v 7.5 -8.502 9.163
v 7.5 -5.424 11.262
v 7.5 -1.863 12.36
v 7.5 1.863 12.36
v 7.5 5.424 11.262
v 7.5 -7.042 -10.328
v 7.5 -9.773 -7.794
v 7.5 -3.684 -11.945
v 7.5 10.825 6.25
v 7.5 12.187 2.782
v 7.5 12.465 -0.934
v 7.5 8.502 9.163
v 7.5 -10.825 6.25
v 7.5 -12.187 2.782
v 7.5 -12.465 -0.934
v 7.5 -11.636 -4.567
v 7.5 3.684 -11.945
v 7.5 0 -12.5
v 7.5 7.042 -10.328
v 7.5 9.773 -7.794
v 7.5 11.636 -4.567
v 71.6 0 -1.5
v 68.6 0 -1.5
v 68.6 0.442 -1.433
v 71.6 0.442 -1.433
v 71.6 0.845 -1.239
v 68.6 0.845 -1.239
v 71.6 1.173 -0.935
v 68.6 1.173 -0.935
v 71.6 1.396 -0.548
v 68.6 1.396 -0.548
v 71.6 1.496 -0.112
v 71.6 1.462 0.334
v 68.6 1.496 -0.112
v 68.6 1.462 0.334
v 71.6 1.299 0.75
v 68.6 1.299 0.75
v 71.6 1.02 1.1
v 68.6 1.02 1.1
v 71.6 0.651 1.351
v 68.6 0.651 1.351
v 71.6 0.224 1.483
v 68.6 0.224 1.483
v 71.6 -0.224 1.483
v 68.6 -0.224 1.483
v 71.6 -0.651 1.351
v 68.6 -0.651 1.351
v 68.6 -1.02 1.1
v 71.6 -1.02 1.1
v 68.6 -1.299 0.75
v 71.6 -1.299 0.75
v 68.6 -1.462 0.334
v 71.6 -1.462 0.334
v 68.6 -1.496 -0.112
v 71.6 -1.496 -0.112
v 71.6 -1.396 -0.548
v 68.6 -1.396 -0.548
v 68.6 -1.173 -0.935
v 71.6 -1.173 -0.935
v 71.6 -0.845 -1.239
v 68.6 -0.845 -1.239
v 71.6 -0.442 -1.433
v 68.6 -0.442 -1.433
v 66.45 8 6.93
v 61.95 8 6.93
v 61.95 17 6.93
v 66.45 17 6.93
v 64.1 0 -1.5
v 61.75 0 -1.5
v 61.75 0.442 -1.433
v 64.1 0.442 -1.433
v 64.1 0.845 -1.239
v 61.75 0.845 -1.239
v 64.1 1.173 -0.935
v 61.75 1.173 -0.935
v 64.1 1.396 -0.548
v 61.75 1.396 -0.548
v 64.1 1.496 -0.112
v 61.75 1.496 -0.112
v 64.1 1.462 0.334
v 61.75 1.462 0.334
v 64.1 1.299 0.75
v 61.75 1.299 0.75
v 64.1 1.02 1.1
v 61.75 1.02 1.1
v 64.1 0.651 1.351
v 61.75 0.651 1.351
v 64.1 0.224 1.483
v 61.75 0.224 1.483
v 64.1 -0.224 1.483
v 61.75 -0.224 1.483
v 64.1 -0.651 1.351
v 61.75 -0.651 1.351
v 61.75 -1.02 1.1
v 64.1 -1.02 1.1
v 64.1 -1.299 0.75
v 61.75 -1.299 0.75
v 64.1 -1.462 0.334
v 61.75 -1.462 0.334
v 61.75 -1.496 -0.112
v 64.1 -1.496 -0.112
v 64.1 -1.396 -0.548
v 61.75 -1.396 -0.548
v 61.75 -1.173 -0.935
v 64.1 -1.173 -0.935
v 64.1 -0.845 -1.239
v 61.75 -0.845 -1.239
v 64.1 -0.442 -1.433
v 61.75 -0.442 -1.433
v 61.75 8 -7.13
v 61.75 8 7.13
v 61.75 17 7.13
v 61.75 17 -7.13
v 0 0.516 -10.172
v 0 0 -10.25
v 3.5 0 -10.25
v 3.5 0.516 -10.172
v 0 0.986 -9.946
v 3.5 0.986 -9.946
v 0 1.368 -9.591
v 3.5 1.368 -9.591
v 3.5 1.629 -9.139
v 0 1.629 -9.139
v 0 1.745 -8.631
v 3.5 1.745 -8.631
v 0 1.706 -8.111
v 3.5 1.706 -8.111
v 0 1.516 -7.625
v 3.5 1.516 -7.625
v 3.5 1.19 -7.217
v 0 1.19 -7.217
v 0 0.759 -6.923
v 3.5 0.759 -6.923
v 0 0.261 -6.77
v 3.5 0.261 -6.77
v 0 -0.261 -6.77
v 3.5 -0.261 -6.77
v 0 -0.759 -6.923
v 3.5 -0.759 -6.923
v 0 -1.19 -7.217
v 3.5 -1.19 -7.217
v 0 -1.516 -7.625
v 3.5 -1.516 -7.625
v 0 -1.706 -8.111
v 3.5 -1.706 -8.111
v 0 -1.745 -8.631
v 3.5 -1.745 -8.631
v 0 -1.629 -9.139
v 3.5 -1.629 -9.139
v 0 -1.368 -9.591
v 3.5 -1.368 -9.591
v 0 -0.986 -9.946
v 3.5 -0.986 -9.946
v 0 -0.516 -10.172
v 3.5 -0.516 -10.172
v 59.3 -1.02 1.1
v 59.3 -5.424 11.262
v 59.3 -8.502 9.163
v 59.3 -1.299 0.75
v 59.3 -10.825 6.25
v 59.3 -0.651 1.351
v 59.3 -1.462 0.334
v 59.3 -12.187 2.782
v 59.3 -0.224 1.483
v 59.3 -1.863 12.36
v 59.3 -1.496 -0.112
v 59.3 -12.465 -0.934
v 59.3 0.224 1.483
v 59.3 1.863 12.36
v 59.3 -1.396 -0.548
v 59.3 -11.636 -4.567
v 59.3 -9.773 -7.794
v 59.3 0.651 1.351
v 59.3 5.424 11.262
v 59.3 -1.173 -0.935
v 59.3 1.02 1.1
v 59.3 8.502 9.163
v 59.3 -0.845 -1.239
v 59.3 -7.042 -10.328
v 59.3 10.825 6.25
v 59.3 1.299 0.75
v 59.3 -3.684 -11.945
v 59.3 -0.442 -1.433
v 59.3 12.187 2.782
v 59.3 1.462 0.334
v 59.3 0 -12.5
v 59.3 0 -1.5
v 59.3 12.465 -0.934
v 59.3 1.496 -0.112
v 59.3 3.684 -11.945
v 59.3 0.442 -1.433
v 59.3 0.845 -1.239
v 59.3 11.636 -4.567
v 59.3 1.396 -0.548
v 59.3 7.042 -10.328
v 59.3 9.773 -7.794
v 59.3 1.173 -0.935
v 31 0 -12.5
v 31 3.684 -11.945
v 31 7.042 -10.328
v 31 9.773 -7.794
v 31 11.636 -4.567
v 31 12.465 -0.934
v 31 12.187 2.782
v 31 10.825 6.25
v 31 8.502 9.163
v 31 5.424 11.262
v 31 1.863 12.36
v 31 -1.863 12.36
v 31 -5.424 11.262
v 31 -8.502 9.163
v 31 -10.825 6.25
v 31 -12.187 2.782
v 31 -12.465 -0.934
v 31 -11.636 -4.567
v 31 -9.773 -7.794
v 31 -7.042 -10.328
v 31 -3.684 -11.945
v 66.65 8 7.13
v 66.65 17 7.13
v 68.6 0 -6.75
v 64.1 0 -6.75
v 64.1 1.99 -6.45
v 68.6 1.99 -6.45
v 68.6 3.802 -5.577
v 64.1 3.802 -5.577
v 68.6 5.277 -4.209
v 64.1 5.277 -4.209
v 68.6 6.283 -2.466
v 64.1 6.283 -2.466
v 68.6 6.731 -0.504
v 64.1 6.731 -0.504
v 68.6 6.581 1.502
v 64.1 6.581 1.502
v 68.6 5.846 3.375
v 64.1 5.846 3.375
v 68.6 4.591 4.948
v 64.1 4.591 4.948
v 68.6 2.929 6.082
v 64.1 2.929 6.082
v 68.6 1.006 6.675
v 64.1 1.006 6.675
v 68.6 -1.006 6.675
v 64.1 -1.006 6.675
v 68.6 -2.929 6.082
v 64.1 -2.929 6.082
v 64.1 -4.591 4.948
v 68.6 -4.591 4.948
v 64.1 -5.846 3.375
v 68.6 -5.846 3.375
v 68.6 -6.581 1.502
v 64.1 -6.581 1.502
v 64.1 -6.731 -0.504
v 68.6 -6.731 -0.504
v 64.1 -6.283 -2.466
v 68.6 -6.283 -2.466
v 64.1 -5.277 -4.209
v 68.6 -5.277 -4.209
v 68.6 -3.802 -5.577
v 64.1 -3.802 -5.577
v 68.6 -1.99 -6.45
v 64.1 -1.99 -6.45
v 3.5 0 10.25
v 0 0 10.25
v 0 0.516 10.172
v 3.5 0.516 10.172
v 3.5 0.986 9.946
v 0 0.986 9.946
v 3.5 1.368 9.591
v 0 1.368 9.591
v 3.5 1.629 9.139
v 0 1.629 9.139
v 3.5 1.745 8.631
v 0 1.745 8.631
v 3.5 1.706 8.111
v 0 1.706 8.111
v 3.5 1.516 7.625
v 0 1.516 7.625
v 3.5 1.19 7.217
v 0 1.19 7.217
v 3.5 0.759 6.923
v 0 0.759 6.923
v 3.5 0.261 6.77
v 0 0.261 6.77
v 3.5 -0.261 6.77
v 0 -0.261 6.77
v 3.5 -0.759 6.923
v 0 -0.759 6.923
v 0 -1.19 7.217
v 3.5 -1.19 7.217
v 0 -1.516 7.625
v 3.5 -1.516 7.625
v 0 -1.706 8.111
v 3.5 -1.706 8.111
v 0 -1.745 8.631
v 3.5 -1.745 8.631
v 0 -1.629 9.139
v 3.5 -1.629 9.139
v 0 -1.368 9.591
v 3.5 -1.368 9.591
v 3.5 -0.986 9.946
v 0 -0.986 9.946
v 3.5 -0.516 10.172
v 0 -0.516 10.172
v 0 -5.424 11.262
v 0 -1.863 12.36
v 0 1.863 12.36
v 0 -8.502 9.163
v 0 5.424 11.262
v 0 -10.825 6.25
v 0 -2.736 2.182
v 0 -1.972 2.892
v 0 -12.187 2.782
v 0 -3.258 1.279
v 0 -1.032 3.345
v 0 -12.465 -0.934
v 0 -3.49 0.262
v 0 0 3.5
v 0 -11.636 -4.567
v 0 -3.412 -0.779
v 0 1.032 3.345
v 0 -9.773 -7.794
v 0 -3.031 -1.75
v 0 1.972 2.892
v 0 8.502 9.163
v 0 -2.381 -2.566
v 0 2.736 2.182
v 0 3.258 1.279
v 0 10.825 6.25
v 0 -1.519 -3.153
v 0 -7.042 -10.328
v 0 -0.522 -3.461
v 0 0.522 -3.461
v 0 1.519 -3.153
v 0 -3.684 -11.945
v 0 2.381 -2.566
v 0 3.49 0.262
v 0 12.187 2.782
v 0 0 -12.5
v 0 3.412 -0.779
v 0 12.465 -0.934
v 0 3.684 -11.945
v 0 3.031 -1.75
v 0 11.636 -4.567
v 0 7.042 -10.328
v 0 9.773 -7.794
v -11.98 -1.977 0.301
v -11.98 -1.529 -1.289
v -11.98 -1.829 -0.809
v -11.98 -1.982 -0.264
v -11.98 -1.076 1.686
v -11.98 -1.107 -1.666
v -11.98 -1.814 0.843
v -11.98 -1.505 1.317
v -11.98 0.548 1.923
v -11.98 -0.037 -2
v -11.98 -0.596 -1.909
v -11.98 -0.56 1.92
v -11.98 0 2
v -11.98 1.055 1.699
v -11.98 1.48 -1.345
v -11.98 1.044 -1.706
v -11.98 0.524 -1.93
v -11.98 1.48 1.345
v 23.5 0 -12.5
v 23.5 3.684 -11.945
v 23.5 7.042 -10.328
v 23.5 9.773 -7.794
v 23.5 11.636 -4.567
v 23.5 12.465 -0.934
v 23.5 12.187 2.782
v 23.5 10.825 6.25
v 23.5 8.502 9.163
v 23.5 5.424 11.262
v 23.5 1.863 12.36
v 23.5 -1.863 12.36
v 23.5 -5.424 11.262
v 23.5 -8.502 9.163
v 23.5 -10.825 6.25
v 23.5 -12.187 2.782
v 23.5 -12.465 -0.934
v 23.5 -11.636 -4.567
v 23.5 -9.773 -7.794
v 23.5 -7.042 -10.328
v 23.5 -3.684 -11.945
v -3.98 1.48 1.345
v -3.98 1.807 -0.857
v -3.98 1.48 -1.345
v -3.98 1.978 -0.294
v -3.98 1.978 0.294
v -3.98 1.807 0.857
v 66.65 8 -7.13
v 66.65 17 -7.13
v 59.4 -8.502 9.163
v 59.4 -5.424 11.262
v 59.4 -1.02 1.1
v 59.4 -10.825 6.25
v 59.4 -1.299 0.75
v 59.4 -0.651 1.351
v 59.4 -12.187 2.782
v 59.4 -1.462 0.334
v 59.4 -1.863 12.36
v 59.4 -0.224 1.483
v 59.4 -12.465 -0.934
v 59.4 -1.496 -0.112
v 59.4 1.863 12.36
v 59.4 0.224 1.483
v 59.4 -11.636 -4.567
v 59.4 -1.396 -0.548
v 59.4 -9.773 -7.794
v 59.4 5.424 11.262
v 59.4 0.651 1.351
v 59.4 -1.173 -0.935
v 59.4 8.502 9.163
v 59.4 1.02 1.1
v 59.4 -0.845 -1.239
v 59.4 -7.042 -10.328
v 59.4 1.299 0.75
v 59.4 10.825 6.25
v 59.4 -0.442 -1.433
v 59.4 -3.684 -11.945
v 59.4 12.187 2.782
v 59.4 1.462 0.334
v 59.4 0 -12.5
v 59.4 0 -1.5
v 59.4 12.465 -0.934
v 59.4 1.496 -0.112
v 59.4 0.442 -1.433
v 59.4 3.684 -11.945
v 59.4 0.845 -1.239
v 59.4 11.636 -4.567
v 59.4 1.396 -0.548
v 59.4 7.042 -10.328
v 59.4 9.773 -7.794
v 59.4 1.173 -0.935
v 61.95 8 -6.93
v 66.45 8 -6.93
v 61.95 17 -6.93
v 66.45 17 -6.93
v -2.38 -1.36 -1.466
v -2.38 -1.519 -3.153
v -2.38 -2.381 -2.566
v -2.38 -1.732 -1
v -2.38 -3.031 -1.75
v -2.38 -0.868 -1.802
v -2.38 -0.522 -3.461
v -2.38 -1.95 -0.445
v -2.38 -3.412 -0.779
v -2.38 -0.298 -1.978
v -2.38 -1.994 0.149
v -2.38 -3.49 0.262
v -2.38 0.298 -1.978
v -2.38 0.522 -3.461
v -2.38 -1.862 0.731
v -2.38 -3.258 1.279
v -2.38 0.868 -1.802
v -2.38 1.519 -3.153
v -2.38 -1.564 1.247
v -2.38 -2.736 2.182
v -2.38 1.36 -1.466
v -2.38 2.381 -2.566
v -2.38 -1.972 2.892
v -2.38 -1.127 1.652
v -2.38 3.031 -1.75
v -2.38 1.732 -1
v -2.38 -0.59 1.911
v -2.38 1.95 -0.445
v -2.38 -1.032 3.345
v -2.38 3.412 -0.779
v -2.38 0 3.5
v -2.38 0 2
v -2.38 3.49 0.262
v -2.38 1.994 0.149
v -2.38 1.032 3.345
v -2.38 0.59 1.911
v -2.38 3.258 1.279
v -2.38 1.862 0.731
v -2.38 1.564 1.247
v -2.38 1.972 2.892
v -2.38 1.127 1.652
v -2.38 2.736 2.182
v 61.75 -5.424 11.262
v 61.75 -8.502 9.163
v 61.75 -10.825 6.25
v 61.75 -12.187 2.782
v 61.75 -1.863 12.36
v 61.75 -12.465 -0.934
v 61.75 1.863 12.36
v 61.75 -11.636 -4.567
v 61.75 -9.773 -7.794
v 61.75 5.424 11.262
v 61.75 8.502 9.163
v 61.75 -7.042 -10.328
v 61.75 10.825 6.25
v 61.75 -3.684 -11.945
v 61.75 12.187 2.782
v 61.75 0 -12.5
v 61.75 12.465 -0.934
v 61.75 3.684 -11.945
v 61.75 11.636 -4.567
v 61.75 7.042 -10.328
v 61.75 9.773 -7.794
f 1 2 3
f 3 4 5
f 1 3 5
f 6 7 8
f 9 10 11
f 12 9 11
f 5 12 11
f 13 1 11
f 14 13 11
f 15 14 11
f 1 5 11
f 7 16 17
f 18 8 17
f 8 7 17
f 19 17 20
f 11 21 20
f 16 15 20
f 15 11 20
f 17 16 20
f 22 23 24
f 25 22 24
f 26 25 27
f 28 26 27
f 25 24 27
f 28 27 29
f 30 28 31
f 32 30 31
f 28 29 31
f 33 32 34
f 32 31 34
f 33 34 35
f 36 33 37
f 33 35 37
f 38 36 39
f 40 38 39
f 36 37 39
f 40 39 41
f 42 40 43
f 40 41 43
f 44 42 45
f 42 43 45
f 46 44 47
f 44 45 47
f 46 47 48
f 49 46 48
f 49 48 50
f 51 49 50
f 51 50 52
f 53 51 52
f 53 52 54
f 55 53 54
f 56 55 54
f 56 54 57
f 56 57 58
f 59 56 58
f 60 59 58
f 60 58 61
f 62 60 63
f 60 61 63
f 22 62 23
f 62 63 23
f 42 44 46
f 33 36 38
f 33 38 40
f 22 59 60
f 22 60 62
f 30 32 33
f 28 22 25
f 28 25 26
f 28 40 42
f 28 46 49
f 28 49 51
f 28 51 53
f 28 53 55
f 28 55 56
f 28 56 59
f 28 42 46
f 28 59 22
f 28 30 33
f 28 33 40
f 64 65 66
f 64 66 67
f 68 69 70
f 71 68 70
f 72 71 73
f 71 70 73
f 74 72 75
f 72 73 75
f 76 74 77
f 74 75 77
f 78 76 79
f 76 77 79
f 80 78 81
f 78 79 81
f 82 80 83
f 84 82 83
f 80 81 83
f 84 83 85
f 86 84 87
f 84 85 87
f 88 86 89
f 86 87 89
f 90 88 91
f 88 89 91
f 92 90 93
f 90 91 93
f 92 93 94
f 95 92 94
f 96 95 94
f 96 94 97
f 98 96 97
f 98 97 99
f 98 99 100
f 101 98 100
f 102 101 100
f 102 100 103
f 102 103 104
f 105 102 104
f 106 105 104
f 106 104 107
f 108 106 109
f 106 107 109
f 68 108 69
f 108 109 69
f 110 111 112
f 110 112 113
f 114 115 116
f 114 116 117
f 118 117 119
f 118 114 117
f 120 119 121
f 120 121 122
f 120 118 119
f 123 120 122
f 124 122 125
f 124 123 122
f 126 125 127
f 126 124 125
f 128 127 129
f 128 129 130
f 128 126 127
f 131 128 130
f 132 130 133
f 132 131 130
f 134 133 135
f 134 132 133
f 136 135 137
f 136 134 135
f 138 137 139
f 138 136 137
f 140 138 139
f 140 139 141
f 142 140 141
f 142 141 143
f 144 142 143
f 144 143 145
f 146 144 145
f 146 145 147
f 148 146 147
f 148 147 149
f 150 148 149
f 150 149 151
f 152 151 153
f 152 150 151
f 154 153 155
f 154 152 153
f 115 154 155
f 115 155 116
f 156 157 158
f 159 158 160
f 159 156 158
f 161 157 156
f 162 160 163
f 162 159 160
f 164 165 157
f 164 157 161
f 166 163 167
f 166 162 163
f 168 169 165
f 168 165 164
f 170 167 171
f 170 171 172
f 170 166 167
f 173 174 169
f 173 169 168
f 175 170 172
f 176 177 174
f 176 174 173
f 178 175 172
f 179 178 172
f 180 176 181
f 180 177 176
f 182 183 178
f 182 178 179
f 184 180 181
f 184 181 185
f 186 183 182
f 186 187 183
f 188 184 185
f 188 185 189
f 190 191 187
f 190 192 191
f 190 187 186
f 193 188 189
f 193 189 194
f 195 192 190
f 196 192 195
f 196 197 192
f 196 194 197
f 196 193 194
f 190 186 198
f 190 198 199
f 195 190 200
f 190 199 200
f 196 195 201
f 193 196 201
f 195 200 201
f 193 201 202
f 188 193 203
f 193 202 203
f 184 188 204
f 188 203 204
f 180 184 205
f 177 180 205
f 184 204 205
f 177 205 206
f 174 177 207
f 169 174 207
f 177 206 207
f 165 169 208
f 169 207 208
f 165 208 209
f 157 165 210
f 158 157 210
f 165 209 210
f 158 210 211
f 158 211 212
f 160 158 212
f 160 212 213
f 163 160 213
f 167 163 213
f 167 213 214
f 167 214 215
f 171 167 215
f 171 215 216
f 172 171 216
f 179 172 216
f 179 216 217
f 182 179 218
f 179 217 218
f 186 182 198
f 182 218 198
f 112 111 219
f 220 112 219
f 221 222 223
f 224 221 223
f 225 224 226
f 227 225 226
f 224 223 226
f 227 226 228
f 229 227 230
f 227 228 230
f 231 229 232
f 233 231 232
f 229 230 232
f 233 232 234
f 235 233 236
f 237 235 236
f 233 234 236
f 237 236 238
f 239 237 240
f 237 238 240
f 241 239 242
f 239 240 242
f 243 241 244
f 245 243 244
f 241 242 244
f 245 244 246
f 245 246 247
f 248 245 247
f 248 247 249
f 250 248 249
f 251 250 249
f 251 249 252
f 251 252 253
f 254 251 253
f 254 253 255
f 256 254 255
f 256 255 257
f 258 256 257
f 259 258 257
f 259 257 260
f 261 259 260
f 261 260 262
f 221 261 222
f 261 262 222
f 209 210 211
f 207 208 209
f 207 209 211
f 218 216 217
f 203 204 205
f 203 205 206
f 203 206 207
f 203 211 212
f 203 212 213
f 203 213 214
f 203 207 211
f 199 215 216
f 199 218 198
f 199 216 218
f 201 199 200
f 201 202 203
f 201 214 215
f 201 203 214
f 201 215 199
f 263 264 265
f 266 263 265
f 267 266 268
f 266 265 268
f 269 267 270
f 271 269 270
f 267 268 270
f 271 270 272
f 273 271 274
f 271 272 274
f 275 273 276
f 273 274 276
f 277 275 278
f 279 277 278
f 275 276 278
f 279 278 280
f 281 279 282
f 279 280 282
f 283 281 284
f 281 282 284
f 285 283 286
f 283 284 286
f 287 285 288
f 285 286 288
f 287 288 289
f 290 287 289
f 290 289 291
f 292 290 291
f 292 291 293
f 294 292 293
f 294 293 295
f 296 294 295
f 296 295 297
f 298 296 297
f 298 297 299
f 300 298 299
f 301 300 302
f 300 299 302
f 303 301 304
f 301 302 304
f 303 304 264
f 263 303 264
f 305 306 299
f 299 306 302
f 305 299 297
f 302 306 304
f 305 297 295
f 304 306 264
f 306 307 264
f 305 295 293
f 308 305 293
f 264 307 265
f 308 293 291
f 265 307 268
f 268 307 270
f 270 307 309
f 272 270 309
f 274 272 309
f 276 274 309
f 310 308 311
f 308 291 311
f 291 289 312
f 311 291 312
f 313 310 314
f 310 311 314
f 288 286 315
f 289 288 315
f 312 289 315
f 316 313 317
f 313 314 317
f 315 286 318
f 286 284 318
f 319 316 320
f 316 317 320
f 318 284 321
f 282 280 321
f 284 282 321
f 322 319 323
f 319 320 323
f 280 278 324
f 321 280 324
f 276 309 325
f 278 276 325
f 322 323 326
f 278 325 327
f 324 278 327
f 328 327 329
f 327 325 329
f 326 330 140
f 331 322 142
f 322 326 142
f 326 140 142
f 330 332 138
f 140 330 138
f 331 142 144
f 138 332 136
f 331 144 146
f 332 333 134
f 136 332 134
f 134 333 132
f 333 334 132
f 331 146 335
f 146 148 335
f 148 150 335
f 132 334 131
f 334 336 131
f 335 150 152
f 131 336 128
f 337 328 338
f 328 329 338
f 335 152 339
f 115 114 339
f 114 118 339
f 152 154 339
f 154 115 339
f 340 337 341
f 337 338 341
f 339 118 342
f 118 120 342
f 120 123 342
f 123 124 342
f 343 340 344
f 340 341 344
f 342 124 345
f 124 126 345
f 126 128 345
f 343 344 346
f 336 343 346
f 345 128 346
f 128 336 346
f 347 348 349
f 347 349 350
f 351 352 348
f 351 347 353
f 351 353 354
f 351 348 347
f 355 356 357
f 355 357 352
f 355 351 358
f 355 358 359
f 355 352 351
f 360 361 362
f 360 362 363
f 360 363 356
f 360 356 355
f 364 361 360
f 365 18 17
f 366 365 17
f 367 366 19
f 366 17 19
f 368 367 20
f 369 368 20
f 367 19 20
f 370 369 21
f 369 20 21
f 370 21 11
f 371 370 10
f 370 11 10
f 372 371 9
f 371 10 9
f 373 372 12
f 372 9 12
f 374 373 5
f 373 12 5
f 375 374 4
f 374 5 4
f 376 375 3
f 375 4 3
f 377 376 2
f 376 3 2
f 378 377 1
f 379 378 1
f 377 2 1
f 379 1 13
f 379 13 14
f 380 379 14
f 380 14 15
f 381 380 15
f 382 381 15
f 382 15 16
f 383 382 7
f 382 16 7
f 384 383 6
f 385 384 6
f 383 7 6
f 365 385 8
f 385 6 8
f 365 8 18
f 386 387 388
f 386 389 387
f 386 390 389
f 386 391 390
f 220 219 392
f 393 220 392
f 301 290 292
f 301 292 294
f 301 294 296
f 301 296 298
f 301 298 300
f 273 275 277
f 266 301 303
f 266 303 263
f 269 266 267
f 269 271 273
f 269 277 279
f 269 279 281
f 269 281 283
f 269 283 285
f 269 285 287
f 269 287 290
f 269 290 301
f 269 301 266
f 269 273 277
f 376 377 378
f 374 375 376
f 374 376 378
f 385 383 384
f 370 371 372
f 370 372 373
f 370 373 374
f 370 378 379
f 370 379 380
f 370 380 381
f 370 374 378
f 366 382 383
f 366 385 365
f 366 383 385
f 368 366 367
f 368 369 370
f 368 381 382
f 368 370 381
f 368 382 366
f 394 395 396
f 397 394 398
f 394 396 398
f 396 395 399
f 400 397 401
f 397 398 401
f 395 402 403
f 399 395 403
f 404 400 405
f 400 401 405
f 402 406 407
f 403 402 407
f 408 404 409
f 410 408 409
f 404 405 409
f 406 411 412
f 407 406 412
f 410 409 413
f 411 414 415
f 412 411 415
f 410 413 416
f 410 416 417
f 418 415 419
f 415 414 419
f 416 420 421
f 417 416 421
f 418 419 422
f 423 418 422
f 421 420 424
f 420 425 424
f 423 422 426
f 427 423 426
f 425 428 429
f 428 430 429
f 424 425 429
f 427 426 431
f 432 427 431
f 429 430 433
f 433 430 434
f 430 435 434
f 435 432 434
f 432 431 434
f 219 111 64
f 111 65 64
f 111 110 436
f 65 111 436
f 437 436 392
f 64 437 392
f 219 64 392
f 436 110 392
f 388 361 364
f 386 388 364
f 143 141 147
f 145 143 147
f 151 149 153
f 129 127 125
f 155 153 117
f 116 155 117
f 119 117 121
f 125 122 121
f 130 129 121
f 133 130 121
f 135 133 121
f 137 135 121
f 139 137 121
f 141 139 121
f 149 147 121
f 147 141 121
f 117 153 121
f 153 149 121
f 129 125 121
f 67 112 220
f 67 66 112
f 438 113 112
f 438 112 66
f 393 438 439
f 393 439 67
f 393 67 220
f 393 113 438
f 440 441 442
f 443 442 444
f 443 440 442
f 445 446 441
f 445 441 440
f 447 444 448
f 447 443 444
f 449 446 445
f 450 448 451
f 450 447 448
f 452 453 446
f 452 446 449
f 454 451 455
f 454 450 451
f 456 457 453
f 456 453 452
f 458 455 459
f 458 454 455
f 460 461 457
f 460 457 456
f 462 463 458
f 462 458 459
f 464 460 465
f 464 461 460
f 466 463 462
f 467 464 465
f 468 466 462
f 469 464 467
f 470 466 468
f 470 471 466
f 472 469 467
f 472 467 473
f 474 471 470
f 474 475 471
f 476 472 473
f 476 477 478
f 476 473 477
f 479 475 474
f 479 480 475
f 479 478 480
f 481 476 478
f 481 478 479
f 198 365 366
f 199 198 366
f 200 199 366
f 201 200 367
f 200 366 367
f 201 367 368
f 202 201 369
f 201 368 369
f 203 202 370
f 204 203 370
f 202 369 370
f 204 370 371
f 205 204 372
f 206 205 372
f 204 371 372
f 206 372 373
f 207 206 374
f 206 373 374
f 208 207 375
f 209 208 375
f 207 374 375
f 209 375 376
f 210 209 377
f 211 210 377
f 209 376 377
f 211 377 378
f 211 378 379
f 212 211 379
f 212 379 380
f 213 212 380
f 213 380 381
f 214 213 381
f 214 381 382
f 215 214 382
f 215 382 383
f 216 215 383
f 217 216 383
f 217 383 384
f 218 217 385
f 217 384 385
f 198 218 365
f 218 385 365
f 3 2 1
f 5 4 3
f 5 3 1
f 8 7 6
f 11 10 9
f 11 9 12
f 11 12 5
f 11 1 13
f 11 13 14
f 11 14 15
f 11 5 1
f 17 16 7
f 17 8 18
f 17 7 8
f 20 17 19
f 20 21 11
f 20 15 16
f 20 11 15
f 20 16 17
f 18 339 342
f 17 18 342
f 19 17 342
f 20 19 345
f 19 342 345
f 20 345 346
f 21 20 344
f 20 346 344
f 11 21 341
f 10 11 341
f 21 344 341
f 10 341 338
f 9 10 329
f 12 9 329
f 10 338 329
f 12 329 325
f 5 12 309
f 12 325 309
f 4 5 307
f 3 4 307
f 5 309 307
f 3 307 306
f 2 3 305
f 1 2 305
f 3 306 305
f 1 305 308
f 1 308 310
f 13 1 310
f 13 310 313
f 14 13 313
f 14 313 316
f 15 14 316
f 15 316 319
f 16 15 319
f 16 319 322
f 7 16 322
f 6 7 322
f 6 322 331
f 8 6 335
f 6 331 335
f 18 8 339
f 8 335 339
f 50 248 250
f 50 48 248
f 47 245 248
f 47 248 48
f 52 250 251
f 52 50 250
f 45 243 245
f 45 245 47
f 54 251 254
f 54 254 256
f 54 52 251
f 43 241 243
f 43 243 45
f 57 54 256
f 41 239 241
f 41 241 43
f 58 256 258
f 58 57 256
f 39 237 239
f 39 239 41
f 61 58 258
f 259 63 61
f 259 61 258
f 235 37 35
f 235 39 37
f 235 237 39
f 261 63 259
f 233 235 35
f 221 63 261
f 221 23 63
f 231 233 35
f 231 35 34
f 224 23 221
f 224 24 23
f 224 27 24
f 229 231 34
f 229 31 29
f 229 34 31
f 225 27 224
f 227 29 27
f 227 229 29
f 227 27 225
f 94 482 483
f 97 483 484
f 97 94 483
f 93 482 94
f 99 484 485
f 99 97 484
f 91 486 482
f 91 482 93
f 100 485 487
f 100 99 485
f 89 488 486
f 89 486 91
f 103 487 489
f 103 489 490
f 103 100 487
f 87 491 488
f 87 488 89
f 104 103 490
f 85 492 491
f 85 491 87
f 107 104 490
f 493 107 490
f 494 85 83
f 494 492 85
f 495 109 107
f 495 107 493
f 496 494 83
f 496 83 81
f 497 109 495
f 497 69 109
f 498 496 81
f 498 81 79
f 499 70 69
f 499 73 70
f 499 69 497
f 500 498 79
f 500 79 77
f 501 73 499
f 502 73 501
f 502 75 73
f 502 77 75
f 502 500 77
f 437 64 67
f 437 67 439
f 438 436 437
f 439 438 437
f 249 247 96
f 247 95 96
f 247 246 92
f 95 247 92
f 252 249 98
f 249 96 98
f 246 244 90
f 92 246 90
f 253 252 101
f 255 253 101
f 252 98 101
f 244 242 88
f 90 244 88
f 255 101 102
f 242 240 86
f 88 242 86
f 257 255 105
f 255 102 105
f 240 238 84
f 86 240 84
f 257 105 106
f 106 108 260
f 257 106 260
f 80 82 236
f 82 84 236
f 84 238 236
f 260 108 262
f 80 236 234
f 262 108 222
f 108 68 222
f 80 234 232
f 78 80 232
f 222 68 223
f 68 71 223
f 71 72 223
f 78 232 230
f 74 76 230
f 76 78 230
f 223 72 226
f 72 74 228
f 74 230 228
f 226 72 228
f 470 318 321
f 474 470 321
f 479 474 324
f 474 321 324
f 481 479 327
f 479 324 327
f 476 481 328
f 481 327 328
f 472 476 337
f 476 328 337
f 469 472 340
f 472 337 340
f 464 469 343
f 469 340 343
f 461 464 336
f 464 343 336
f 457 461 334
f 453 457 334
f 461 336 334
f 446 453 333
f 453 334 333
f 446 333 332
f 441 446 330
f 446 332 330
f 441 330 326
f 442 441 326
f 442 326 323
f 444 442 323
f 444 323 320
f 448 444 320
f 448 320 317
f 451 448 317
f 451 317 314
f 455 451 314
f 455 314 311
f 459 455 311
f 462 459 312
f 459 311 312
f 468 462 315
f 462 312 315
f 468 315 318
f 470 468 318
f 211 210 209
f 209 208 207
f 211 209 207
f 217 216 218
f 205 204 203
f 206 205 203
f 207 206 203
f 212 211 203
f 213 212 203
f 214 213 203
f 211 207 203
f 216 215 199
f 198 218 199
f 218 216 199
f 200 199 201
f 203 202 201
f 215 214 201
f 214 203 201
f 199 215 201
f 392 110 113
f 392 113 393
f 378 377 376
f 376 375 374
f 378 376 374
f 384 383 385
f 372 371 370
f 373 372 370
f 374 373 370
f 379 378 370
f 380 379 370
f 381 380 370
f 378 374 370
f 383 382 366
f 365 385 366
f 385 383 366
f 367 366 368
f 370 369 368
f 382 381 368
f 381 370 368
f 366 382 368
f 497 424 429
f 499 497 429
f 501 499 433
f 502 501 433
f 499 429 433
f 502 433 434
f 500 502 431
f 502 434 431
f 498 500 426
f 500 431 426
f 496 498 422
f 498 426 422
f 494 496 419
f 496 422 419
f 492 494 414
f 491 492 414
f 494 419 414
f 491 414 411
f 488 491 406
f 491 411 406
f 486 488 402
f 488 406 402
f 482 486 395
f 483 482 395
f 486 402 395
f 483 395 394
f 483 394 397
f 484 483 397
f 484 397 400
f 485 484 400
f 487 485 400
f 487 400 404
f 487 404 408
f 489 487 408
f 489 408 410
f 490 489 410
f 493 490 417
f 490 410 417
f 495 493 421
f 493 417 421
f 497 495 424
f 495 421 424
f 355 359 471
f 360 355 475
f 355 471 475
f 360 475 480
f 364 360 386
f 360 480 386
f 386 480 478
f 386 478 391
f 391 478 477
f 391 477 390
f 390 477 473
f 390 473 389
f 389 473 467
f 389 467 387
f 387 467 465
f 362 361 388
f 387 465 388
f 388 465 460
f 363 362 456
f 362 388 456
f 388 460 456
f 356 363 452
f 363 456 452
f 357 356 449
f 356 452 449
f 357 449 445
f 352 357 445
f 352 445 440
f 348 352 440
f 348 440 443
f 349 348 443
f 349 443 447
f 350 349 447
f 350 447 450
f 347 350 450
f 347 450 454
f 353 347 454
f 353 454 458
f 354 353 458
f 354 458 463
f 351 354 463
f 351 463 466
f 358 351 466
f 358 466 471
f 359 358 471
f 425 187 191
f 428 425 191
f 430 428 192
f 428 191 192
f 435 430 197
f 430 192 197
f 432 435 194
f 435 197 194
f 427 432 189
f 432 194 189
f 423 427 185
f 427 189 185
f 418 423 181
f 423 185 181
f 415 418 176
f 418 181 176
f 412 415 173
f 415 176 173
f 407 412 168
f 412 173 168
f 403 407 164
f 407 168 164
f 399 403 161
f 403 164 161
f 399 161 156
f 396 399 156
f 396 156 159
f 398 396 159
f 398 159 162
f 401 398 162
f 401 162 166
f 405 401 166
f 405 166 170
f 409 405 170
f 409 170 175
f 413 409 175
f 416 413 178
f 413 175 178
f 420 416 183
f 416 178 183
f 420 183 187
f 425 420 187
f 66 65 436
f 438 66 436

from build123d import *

# Parameters (mm, degrees)
SKETCH_1_R          = 12.5
EXTRUDE_1_DEPTH     = 7.5
SKETCH_3_R          = 12.5
EXTRUDE_3_DEPTH     = 16
SKETCH_4_R          = 12.5
EXTRUDE_4_DEPTH     = 7.5
SKETCH_5_R          = 12.5
EXTRUDE_5_DEPTH     = 28.3
SKETCH_6_R          = 1.5
EXTRUDE_10_DEPTH    = 0.1
SKETCH_10_R         = 12.5
EXTRUDE_11_DEPTH    = 2.35
SKETCH_12_R         = 1.5
EXTRUDE_12_DEPTH    = 2.35
SKETCH_13_R         = 6.75
EXTRUDE_13_DEPTH    = 4.5
SKETCH_14_R         = 1.5
EXTRUDE_14_DEPTH    = 3
EXTRUDE_START       = 8
SKETCH_15_W         = 4.9
SKETCH_15_H         = 14.26
SKETCH_15_W_2       = 4.5
SKETCH_15_H_2       = 13.86
EXTRUDE_1_2_DEPTH   = 9
SKETCH_16_R         = 3.5
EXTRUDE_15_DEPTH    = 2.38
SKETCH_17_R         = 2
EXTRUDE_16_DEPTH    = 9.6
SKETCH_18_W         = 2.690427476
SKETCH_18_H         = 0.755115775
CUT_EXTRUDE_1_DEPTH = 8
SKETCH_19_R         = 1.75
CUT_EXTRUDE_2_DEPTH = 3.5


with BuildPart() as part:
    # 草图1 → Extrude 1 (new body)
    with BuildSketch(Plane(origin=(0, 0, 0), x_dir=(0, 0, -1), z_dir=(1, 0, 0))):
        Circle(SKETCH_1_R)
    extrude(amount=EXTRUDE_1_DEPTH)

    # 草图16 → 凸台-拉伸15 (add)
    with BuildSketch(Plane.ZY):
        Circle(SKETCH_16_R)
    extrude(amount=EXTRUDE_15_DEPTH)

    # 草图17 → 凸台-拉伸16 (add)
    with BuildSketch(Plane.ZY.offset(2.38)):
        Circle(SKETCH_17_R)
    extrude(amount=EXTRUDE_16_DEPTH)

    # 草图18 → 切除-拉伸1 (cut)
    with BuildSketch(Plane.ZY.offset(11.98)):
        with Locations((0, 1.857557888)):
            Rectangle(SKETCH_18_W, SKETCH_18_H)
    extrude(amount=-CUT_EXTRUDE_1_DEPTH, mode=Mode.SUBTRACT)

    # 草图19 → 切除-拉伸2 (cut)
    with BuildSketch(Plane.ZY):
        with Locations((8.5, 0)):
            Circle(SKETCH_19_R)
    cut_extrude_2 = extrude(amount=-CUT_EXTRUDE_2_DEPTH, mode=Mode.SUBTRACT)

    # 镜向1: 切除-拉伸2 across plane
    add(cut_extrude_2.mirror(Plane.XY), mode=Mode.SUBTRACT)


with BuildPart() as body_2:
    # 草图3 → 凸台-拉伸3 (new body)
    with BuildSketch(Plane(origin=(7.5, 0, 0), x_dir=(0, 0, -1), z_dir=(1, 0, 0))):
        Circle(SKETCH_3_R)
    extrude(amount=EXTRUDE_3_DEPTH)


with BuildPart() as body_3:
    # 草图4 → 凸台-拉伸4 (new body)
    with BuildSketch(Plane(origin=(23.5, 0, 0), x_dir=(0, 0, -1), z_dir=(1, 0, 0))):
        Circle(SKETCH_4_R)
    extrude(amount=EXTRUDE_4_DEPTH)


with BuildPart() as body_4:
    # 草图5 → 凸台-拉伸5 (new body)
    with BuildSketch(Plane(origin=(31, 0, 0), x_dir=(0, 0, -1), z_dir=(1, 0, 0))):
        Circle(SKETCH_5_R)
    extrude(amount=EXTRUDE_5_DEPTH)

    # 草图6 → 凸台-拉伸10 (add)
    with BuildSketch(Plane(origin=(59.3, 0, 0), x_dir=(0, 0, -1), z_dir=(1, 0, 0))):
        Circle(SKETCH_6_R)
    extrude(amount=EXTRUDE_10_DEPTH)

    # 草图10 → 凸台-拉伸11 (add)
    with BuildSketch(Plane(origin=(59.4, 0, 0), x_dir=(0, 0, -1), z_dir=(1, 0, 0))):
        Circle(SKETCH_10_R)
    extrude(amount=EXTRUDE_11_DEPTH)

    # 草图12 → 凸台-拉伸12 (add)
    with BuildSketch(Plane(origin=(61.75, 0, 0), x_dir=(0, 0, -1), z_dir=(1, 0, 0))):
        Circle(SKETCH_12_R)
    extrude(amount=EXTRUDE_12_DEPTH)

    # 草图13 → 凸台-拉伸13 (add)
    with BuildSketch(Plane(origin=(64.1, 0, 0), x_dir=(0, 0, -1), z_dir=(1, 0, 0))):
        Circle(SKETCH_13_R)
    extrude(amount=EXTRUDE_13_DEPTH)

    # 草图14 → 凸台-拉伸14 (add)
    with BuildSketch(Plane(origin=(68.6, 0, 0), x_dir=(0, 0, -1), z_dir=(1, 0, 0))):
        Circle(SKETCH_14_R)
    extrude(amount=EXTRUDE_14_DEPTH)


with BuildPart() as body_5:
    # 草图15 → Extrude 1 2 (new body)
    with BuildSketch(Plane(origin=(0, 0, 0), x_dir=(1, 0, 0), z_dir=(0, 1, 0)).offset(EXTRUDE_START)):
        with Locations((64.2, 0)):
            Rectangle(SKETCH_15_W, SKETCH_15_H)
        with Locations((64.2, 0)):
            Rectangle(SKETCH_15_W_2, SKETCH_15_H_2, mode=Mode.SUBTRACT)
    extrude(amount=EXTRUDE_1_2_DEPTH)


solid = Compound([part.part, body_2.part, body_3.part, body_4.part, body_5.part])
